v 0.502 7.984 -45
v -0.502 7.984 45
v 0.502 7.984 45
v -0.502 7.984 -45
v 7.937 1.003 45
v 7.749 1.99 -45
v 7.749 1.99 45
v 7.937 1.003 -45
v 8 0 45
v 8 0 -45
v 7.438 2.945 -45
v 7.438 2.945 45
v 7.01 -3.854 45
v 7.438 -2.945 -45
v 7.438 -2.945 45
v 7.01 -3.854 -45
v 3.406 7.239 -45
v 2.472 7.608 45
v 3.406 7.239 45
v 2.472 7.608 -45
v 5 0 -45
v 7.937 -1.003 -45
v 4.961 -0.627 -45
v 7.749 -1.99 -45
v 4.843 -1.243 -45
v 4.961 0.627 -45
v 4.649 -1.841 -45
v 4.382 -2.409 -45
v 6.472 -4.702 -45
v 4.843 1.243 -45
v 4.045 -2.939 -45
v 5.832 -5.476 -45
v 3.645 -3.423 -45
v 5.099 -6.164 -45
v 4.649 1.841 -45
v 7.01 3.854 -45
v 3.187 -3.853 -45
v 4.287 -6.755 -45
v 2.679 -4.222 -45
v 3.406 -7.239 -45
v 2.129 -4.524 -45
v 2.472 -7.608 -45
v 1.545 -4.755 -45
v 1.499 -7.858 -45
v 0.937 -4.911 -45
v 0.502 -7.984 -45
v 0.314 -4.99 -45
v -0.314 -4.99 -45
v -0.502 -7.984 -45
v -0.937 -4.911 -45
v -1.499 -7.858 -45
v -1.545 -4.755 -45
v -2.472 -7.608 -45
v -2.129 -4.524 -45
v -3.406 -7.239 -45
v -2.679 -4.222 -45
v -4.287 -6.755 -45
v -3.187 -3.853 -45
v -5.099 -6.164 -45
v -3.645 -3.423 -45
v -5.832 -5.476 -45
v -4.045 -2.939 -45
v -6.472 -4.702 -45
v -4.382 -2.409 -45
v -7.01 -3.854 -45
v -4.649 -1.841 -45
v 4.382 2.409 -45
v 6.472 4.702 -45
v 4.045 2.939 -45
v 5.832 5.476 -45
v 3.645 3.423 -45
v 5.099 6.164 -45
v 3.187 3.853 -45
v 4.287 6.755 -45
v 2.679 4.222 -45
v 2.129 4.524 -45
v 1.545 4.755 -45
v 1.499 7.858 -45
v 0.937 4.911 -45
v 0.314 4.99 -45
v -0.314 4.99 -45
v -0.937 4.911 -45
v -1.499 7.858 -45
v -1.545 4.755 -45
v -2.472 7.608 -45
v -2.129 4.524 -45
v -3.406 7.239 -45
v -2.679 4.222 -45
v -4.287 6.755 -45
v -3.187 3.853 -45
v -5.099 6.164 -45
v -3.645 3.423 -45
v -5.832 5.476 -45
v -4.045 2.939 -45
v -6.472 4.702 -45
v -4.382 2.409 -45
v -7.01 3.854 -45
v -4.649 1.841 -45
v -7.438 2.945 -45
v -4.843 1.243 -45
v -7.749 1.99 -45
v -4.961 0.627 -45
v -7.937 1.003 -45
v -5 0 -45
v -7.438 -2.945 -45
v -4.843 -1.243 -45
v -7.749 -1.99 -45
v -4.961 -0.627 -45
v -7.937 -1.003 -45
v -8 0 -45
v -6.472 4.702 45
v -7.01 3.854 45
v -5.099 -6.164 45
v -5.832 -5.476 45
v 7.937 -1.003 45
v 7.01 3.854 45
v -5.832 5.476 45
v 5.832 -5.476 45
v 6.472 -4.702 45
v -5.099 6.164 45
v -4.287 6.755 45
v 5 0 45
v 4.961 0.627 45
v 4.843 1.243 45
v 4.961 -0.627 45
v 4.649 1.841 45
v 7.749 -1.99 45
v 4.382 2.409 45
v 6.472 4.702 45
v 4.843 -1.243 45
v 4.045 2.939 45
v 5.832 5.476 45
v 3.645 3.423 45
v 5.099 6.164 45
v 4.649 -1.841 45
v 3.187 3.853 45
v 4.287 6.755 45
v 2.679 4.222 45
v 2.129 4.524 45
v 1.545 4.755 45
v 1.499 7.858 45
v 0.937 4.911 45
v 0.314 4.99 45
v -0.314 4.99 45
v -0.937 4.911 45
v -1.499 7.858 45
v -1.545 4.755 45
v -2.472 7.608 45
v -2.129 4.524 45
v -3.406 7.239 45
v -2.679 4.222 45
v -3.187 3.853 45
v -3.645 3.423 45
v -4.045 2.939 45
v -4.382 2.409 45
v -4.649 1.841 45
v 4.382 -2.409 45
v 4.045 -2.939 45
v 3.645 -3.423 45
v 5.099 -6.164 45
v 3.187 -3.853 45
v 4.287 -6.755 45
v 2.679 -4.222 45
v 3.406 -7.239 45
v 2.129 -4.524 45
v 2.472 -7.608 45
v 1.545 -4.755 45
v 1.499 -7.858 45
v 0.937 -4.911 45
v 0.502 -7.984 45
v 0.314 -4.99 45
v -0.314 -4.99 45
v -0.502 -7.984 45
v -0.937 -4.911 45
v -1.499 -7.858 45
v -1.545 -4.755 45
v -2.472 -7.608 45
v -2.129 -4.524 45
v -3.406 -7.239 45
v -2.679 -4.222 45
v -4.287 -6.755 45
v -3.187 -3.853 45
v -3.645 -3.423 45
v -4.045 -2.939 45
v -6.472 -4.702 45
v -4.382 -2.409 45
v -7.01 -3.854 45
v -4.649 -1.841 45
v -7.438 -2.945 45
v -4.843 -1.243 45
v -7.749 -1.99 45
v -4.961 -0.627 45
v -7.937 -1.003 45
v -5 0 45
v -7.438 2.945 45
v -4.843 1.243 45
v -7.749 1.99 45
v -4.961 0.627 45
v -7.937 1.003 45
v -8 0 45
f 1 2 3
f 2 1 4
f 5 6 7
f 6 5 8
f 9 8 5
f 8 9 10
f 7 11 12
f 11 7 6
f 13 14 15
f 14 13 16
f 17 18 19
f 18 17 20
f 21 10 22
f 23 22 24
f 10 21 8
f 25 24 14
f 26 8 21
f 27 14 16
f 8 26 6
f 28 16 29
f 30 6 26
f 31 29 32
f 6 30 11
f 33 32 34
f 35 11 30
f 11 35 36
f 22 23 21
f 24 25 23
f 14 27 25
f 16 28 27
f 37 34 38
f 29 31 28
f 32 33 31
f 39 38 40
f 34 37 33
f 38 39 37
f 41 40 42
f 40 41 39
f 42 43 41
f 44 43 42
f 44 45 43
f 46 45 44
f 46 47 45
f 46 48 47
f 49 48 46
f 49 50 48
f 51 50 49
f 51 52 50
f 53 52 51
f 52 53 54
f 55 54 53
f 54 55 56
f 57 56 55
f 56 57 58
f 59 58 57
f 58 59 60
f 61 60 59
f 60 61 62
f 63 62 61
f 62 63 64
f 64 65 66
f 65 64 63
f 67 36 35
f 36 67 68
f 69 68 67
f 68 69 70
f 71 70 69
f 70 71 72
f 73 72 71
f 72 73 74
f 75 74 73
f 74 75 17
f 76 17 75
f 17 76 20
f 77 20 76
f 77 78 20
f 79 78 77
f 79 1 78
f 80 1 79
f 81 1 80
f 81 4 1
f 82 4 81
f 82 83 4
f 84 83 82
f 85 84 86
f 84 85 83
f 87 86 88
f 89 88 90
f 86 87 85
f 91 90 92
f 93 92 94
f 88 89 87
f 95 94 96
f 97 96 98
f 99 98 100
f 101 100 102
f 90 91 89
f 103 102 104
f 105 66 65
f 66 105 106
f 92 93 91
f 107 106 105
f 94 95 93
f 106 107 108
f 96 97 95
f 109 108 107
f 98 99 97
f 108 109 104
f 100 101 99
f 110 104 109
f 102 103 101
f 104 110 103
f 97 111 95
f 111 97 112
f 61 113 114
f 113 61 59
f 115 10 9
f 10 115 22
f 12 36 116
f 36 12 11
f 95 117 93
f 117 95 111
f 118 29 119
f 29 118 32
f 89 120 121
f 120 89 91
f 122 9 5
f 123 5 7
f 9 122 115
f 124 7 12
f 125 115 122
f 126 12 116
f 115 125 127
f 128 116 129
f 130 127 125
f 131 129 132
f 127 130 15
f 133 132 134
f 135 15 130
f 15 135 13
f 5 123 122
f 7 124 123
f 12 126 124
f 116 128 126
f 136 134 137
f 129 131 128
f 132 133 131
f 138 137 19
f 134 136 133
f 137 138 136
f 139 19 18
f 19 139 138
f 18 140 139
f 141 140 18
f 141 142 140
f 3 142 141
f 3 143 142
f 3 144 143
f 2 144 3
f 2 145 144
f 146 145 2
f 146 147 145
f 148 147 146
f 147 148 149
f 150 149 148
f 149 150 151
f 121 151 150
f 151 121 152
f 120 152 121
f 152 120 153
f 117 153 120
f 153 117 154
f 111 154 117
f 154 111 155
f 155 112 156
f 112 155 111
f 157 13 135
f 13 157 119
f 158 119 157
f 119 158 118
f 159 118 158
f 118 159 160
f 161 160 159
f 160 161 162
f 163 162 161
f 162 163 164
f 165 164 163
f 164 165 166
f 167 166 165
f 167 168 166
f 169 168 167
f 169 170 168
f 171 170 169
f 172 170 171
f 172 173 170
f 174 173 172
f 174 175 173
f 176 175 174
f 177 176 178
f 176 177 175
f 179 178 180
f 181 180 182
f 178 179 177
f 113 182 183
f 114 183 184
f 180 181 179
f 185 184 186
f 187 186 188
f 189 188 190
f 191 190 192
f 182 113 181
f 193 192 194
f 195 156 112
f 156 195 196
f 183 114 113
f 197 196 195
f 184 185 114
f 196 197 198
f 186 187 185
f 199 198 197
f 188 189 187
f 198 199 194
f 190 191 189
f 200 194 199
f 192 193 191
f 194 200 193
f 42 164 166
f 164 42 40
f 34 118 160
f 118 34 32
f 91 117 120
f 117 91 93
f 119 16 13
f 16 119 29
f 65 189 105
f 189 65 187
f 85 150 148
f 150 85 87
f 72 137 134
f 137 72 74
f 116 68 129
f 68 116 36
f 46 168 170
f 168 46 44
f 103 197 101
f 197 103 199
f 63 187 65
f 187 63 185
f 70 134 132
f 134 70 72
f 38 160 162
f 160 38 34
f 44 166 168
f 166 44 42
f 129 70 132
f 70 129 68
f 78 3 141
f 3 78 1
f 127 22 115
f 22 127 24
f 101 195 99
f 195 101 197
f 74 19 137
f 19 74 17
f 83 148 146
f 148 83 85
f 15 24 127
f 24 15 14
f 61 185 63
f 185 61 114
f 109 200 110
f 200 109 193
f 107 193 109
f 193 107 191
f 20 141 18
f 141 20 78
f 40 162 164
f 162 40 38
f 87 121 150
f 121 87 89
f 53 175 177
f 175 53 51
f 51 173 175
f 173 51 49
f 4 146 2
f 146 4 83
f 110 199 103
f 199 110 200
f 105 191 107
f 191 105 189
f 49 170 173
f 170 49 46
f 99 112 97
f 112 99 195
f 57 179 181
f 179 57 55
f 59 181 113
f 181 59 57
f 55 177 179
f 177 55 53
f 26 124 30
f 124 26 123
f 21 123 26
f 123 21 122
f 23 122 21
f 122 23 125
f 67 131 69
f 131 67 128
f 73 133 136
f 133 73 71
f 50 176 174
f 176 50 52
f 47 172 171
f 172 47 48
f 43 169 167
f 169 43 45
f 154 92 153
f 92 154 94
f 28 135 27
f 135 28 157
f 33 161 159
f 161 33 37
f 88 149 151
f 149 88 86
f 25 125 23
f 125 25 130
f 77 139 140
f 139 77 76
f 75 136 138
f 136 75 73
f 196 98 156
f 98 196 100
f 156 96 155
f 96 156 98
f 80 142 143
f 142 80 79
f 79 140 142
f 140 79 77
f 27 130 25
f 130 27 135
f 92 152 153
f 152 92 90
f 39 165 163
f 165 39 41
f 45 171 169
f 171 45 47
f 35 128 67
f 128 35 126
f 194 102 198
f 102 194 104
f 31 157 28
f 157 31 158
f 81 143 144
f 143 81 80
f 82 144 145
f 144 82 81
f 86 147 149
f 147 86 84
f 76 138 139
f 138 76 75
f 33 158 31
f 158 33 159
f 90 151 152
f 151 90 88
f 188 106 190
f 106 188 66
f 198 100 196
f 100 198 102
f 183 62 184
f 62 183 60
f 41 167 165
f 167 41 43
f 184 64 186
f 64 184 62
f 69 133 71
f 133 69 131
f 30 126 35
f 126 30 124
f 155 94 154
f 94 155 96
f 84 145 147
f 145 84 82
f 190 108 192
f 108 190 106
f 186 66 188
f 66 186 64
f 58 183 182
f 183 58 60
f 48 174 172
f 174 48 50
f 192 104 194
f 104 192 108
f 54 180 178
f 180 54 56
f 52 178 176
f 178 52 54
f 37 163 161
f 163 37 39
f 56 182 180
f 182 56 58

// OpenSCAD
$fn = 50;


difference() {
	union() {
		translate(v = [0, 0, -45.0000000000]) {
			cylinder(h = 90, r = 8.0000000000);
		}
	}
	union() {
		translate(v = [0, 0, -100.0000000000]) {
			cylinder(h = 200, r = 5.0000000000);
		}
	}
}
